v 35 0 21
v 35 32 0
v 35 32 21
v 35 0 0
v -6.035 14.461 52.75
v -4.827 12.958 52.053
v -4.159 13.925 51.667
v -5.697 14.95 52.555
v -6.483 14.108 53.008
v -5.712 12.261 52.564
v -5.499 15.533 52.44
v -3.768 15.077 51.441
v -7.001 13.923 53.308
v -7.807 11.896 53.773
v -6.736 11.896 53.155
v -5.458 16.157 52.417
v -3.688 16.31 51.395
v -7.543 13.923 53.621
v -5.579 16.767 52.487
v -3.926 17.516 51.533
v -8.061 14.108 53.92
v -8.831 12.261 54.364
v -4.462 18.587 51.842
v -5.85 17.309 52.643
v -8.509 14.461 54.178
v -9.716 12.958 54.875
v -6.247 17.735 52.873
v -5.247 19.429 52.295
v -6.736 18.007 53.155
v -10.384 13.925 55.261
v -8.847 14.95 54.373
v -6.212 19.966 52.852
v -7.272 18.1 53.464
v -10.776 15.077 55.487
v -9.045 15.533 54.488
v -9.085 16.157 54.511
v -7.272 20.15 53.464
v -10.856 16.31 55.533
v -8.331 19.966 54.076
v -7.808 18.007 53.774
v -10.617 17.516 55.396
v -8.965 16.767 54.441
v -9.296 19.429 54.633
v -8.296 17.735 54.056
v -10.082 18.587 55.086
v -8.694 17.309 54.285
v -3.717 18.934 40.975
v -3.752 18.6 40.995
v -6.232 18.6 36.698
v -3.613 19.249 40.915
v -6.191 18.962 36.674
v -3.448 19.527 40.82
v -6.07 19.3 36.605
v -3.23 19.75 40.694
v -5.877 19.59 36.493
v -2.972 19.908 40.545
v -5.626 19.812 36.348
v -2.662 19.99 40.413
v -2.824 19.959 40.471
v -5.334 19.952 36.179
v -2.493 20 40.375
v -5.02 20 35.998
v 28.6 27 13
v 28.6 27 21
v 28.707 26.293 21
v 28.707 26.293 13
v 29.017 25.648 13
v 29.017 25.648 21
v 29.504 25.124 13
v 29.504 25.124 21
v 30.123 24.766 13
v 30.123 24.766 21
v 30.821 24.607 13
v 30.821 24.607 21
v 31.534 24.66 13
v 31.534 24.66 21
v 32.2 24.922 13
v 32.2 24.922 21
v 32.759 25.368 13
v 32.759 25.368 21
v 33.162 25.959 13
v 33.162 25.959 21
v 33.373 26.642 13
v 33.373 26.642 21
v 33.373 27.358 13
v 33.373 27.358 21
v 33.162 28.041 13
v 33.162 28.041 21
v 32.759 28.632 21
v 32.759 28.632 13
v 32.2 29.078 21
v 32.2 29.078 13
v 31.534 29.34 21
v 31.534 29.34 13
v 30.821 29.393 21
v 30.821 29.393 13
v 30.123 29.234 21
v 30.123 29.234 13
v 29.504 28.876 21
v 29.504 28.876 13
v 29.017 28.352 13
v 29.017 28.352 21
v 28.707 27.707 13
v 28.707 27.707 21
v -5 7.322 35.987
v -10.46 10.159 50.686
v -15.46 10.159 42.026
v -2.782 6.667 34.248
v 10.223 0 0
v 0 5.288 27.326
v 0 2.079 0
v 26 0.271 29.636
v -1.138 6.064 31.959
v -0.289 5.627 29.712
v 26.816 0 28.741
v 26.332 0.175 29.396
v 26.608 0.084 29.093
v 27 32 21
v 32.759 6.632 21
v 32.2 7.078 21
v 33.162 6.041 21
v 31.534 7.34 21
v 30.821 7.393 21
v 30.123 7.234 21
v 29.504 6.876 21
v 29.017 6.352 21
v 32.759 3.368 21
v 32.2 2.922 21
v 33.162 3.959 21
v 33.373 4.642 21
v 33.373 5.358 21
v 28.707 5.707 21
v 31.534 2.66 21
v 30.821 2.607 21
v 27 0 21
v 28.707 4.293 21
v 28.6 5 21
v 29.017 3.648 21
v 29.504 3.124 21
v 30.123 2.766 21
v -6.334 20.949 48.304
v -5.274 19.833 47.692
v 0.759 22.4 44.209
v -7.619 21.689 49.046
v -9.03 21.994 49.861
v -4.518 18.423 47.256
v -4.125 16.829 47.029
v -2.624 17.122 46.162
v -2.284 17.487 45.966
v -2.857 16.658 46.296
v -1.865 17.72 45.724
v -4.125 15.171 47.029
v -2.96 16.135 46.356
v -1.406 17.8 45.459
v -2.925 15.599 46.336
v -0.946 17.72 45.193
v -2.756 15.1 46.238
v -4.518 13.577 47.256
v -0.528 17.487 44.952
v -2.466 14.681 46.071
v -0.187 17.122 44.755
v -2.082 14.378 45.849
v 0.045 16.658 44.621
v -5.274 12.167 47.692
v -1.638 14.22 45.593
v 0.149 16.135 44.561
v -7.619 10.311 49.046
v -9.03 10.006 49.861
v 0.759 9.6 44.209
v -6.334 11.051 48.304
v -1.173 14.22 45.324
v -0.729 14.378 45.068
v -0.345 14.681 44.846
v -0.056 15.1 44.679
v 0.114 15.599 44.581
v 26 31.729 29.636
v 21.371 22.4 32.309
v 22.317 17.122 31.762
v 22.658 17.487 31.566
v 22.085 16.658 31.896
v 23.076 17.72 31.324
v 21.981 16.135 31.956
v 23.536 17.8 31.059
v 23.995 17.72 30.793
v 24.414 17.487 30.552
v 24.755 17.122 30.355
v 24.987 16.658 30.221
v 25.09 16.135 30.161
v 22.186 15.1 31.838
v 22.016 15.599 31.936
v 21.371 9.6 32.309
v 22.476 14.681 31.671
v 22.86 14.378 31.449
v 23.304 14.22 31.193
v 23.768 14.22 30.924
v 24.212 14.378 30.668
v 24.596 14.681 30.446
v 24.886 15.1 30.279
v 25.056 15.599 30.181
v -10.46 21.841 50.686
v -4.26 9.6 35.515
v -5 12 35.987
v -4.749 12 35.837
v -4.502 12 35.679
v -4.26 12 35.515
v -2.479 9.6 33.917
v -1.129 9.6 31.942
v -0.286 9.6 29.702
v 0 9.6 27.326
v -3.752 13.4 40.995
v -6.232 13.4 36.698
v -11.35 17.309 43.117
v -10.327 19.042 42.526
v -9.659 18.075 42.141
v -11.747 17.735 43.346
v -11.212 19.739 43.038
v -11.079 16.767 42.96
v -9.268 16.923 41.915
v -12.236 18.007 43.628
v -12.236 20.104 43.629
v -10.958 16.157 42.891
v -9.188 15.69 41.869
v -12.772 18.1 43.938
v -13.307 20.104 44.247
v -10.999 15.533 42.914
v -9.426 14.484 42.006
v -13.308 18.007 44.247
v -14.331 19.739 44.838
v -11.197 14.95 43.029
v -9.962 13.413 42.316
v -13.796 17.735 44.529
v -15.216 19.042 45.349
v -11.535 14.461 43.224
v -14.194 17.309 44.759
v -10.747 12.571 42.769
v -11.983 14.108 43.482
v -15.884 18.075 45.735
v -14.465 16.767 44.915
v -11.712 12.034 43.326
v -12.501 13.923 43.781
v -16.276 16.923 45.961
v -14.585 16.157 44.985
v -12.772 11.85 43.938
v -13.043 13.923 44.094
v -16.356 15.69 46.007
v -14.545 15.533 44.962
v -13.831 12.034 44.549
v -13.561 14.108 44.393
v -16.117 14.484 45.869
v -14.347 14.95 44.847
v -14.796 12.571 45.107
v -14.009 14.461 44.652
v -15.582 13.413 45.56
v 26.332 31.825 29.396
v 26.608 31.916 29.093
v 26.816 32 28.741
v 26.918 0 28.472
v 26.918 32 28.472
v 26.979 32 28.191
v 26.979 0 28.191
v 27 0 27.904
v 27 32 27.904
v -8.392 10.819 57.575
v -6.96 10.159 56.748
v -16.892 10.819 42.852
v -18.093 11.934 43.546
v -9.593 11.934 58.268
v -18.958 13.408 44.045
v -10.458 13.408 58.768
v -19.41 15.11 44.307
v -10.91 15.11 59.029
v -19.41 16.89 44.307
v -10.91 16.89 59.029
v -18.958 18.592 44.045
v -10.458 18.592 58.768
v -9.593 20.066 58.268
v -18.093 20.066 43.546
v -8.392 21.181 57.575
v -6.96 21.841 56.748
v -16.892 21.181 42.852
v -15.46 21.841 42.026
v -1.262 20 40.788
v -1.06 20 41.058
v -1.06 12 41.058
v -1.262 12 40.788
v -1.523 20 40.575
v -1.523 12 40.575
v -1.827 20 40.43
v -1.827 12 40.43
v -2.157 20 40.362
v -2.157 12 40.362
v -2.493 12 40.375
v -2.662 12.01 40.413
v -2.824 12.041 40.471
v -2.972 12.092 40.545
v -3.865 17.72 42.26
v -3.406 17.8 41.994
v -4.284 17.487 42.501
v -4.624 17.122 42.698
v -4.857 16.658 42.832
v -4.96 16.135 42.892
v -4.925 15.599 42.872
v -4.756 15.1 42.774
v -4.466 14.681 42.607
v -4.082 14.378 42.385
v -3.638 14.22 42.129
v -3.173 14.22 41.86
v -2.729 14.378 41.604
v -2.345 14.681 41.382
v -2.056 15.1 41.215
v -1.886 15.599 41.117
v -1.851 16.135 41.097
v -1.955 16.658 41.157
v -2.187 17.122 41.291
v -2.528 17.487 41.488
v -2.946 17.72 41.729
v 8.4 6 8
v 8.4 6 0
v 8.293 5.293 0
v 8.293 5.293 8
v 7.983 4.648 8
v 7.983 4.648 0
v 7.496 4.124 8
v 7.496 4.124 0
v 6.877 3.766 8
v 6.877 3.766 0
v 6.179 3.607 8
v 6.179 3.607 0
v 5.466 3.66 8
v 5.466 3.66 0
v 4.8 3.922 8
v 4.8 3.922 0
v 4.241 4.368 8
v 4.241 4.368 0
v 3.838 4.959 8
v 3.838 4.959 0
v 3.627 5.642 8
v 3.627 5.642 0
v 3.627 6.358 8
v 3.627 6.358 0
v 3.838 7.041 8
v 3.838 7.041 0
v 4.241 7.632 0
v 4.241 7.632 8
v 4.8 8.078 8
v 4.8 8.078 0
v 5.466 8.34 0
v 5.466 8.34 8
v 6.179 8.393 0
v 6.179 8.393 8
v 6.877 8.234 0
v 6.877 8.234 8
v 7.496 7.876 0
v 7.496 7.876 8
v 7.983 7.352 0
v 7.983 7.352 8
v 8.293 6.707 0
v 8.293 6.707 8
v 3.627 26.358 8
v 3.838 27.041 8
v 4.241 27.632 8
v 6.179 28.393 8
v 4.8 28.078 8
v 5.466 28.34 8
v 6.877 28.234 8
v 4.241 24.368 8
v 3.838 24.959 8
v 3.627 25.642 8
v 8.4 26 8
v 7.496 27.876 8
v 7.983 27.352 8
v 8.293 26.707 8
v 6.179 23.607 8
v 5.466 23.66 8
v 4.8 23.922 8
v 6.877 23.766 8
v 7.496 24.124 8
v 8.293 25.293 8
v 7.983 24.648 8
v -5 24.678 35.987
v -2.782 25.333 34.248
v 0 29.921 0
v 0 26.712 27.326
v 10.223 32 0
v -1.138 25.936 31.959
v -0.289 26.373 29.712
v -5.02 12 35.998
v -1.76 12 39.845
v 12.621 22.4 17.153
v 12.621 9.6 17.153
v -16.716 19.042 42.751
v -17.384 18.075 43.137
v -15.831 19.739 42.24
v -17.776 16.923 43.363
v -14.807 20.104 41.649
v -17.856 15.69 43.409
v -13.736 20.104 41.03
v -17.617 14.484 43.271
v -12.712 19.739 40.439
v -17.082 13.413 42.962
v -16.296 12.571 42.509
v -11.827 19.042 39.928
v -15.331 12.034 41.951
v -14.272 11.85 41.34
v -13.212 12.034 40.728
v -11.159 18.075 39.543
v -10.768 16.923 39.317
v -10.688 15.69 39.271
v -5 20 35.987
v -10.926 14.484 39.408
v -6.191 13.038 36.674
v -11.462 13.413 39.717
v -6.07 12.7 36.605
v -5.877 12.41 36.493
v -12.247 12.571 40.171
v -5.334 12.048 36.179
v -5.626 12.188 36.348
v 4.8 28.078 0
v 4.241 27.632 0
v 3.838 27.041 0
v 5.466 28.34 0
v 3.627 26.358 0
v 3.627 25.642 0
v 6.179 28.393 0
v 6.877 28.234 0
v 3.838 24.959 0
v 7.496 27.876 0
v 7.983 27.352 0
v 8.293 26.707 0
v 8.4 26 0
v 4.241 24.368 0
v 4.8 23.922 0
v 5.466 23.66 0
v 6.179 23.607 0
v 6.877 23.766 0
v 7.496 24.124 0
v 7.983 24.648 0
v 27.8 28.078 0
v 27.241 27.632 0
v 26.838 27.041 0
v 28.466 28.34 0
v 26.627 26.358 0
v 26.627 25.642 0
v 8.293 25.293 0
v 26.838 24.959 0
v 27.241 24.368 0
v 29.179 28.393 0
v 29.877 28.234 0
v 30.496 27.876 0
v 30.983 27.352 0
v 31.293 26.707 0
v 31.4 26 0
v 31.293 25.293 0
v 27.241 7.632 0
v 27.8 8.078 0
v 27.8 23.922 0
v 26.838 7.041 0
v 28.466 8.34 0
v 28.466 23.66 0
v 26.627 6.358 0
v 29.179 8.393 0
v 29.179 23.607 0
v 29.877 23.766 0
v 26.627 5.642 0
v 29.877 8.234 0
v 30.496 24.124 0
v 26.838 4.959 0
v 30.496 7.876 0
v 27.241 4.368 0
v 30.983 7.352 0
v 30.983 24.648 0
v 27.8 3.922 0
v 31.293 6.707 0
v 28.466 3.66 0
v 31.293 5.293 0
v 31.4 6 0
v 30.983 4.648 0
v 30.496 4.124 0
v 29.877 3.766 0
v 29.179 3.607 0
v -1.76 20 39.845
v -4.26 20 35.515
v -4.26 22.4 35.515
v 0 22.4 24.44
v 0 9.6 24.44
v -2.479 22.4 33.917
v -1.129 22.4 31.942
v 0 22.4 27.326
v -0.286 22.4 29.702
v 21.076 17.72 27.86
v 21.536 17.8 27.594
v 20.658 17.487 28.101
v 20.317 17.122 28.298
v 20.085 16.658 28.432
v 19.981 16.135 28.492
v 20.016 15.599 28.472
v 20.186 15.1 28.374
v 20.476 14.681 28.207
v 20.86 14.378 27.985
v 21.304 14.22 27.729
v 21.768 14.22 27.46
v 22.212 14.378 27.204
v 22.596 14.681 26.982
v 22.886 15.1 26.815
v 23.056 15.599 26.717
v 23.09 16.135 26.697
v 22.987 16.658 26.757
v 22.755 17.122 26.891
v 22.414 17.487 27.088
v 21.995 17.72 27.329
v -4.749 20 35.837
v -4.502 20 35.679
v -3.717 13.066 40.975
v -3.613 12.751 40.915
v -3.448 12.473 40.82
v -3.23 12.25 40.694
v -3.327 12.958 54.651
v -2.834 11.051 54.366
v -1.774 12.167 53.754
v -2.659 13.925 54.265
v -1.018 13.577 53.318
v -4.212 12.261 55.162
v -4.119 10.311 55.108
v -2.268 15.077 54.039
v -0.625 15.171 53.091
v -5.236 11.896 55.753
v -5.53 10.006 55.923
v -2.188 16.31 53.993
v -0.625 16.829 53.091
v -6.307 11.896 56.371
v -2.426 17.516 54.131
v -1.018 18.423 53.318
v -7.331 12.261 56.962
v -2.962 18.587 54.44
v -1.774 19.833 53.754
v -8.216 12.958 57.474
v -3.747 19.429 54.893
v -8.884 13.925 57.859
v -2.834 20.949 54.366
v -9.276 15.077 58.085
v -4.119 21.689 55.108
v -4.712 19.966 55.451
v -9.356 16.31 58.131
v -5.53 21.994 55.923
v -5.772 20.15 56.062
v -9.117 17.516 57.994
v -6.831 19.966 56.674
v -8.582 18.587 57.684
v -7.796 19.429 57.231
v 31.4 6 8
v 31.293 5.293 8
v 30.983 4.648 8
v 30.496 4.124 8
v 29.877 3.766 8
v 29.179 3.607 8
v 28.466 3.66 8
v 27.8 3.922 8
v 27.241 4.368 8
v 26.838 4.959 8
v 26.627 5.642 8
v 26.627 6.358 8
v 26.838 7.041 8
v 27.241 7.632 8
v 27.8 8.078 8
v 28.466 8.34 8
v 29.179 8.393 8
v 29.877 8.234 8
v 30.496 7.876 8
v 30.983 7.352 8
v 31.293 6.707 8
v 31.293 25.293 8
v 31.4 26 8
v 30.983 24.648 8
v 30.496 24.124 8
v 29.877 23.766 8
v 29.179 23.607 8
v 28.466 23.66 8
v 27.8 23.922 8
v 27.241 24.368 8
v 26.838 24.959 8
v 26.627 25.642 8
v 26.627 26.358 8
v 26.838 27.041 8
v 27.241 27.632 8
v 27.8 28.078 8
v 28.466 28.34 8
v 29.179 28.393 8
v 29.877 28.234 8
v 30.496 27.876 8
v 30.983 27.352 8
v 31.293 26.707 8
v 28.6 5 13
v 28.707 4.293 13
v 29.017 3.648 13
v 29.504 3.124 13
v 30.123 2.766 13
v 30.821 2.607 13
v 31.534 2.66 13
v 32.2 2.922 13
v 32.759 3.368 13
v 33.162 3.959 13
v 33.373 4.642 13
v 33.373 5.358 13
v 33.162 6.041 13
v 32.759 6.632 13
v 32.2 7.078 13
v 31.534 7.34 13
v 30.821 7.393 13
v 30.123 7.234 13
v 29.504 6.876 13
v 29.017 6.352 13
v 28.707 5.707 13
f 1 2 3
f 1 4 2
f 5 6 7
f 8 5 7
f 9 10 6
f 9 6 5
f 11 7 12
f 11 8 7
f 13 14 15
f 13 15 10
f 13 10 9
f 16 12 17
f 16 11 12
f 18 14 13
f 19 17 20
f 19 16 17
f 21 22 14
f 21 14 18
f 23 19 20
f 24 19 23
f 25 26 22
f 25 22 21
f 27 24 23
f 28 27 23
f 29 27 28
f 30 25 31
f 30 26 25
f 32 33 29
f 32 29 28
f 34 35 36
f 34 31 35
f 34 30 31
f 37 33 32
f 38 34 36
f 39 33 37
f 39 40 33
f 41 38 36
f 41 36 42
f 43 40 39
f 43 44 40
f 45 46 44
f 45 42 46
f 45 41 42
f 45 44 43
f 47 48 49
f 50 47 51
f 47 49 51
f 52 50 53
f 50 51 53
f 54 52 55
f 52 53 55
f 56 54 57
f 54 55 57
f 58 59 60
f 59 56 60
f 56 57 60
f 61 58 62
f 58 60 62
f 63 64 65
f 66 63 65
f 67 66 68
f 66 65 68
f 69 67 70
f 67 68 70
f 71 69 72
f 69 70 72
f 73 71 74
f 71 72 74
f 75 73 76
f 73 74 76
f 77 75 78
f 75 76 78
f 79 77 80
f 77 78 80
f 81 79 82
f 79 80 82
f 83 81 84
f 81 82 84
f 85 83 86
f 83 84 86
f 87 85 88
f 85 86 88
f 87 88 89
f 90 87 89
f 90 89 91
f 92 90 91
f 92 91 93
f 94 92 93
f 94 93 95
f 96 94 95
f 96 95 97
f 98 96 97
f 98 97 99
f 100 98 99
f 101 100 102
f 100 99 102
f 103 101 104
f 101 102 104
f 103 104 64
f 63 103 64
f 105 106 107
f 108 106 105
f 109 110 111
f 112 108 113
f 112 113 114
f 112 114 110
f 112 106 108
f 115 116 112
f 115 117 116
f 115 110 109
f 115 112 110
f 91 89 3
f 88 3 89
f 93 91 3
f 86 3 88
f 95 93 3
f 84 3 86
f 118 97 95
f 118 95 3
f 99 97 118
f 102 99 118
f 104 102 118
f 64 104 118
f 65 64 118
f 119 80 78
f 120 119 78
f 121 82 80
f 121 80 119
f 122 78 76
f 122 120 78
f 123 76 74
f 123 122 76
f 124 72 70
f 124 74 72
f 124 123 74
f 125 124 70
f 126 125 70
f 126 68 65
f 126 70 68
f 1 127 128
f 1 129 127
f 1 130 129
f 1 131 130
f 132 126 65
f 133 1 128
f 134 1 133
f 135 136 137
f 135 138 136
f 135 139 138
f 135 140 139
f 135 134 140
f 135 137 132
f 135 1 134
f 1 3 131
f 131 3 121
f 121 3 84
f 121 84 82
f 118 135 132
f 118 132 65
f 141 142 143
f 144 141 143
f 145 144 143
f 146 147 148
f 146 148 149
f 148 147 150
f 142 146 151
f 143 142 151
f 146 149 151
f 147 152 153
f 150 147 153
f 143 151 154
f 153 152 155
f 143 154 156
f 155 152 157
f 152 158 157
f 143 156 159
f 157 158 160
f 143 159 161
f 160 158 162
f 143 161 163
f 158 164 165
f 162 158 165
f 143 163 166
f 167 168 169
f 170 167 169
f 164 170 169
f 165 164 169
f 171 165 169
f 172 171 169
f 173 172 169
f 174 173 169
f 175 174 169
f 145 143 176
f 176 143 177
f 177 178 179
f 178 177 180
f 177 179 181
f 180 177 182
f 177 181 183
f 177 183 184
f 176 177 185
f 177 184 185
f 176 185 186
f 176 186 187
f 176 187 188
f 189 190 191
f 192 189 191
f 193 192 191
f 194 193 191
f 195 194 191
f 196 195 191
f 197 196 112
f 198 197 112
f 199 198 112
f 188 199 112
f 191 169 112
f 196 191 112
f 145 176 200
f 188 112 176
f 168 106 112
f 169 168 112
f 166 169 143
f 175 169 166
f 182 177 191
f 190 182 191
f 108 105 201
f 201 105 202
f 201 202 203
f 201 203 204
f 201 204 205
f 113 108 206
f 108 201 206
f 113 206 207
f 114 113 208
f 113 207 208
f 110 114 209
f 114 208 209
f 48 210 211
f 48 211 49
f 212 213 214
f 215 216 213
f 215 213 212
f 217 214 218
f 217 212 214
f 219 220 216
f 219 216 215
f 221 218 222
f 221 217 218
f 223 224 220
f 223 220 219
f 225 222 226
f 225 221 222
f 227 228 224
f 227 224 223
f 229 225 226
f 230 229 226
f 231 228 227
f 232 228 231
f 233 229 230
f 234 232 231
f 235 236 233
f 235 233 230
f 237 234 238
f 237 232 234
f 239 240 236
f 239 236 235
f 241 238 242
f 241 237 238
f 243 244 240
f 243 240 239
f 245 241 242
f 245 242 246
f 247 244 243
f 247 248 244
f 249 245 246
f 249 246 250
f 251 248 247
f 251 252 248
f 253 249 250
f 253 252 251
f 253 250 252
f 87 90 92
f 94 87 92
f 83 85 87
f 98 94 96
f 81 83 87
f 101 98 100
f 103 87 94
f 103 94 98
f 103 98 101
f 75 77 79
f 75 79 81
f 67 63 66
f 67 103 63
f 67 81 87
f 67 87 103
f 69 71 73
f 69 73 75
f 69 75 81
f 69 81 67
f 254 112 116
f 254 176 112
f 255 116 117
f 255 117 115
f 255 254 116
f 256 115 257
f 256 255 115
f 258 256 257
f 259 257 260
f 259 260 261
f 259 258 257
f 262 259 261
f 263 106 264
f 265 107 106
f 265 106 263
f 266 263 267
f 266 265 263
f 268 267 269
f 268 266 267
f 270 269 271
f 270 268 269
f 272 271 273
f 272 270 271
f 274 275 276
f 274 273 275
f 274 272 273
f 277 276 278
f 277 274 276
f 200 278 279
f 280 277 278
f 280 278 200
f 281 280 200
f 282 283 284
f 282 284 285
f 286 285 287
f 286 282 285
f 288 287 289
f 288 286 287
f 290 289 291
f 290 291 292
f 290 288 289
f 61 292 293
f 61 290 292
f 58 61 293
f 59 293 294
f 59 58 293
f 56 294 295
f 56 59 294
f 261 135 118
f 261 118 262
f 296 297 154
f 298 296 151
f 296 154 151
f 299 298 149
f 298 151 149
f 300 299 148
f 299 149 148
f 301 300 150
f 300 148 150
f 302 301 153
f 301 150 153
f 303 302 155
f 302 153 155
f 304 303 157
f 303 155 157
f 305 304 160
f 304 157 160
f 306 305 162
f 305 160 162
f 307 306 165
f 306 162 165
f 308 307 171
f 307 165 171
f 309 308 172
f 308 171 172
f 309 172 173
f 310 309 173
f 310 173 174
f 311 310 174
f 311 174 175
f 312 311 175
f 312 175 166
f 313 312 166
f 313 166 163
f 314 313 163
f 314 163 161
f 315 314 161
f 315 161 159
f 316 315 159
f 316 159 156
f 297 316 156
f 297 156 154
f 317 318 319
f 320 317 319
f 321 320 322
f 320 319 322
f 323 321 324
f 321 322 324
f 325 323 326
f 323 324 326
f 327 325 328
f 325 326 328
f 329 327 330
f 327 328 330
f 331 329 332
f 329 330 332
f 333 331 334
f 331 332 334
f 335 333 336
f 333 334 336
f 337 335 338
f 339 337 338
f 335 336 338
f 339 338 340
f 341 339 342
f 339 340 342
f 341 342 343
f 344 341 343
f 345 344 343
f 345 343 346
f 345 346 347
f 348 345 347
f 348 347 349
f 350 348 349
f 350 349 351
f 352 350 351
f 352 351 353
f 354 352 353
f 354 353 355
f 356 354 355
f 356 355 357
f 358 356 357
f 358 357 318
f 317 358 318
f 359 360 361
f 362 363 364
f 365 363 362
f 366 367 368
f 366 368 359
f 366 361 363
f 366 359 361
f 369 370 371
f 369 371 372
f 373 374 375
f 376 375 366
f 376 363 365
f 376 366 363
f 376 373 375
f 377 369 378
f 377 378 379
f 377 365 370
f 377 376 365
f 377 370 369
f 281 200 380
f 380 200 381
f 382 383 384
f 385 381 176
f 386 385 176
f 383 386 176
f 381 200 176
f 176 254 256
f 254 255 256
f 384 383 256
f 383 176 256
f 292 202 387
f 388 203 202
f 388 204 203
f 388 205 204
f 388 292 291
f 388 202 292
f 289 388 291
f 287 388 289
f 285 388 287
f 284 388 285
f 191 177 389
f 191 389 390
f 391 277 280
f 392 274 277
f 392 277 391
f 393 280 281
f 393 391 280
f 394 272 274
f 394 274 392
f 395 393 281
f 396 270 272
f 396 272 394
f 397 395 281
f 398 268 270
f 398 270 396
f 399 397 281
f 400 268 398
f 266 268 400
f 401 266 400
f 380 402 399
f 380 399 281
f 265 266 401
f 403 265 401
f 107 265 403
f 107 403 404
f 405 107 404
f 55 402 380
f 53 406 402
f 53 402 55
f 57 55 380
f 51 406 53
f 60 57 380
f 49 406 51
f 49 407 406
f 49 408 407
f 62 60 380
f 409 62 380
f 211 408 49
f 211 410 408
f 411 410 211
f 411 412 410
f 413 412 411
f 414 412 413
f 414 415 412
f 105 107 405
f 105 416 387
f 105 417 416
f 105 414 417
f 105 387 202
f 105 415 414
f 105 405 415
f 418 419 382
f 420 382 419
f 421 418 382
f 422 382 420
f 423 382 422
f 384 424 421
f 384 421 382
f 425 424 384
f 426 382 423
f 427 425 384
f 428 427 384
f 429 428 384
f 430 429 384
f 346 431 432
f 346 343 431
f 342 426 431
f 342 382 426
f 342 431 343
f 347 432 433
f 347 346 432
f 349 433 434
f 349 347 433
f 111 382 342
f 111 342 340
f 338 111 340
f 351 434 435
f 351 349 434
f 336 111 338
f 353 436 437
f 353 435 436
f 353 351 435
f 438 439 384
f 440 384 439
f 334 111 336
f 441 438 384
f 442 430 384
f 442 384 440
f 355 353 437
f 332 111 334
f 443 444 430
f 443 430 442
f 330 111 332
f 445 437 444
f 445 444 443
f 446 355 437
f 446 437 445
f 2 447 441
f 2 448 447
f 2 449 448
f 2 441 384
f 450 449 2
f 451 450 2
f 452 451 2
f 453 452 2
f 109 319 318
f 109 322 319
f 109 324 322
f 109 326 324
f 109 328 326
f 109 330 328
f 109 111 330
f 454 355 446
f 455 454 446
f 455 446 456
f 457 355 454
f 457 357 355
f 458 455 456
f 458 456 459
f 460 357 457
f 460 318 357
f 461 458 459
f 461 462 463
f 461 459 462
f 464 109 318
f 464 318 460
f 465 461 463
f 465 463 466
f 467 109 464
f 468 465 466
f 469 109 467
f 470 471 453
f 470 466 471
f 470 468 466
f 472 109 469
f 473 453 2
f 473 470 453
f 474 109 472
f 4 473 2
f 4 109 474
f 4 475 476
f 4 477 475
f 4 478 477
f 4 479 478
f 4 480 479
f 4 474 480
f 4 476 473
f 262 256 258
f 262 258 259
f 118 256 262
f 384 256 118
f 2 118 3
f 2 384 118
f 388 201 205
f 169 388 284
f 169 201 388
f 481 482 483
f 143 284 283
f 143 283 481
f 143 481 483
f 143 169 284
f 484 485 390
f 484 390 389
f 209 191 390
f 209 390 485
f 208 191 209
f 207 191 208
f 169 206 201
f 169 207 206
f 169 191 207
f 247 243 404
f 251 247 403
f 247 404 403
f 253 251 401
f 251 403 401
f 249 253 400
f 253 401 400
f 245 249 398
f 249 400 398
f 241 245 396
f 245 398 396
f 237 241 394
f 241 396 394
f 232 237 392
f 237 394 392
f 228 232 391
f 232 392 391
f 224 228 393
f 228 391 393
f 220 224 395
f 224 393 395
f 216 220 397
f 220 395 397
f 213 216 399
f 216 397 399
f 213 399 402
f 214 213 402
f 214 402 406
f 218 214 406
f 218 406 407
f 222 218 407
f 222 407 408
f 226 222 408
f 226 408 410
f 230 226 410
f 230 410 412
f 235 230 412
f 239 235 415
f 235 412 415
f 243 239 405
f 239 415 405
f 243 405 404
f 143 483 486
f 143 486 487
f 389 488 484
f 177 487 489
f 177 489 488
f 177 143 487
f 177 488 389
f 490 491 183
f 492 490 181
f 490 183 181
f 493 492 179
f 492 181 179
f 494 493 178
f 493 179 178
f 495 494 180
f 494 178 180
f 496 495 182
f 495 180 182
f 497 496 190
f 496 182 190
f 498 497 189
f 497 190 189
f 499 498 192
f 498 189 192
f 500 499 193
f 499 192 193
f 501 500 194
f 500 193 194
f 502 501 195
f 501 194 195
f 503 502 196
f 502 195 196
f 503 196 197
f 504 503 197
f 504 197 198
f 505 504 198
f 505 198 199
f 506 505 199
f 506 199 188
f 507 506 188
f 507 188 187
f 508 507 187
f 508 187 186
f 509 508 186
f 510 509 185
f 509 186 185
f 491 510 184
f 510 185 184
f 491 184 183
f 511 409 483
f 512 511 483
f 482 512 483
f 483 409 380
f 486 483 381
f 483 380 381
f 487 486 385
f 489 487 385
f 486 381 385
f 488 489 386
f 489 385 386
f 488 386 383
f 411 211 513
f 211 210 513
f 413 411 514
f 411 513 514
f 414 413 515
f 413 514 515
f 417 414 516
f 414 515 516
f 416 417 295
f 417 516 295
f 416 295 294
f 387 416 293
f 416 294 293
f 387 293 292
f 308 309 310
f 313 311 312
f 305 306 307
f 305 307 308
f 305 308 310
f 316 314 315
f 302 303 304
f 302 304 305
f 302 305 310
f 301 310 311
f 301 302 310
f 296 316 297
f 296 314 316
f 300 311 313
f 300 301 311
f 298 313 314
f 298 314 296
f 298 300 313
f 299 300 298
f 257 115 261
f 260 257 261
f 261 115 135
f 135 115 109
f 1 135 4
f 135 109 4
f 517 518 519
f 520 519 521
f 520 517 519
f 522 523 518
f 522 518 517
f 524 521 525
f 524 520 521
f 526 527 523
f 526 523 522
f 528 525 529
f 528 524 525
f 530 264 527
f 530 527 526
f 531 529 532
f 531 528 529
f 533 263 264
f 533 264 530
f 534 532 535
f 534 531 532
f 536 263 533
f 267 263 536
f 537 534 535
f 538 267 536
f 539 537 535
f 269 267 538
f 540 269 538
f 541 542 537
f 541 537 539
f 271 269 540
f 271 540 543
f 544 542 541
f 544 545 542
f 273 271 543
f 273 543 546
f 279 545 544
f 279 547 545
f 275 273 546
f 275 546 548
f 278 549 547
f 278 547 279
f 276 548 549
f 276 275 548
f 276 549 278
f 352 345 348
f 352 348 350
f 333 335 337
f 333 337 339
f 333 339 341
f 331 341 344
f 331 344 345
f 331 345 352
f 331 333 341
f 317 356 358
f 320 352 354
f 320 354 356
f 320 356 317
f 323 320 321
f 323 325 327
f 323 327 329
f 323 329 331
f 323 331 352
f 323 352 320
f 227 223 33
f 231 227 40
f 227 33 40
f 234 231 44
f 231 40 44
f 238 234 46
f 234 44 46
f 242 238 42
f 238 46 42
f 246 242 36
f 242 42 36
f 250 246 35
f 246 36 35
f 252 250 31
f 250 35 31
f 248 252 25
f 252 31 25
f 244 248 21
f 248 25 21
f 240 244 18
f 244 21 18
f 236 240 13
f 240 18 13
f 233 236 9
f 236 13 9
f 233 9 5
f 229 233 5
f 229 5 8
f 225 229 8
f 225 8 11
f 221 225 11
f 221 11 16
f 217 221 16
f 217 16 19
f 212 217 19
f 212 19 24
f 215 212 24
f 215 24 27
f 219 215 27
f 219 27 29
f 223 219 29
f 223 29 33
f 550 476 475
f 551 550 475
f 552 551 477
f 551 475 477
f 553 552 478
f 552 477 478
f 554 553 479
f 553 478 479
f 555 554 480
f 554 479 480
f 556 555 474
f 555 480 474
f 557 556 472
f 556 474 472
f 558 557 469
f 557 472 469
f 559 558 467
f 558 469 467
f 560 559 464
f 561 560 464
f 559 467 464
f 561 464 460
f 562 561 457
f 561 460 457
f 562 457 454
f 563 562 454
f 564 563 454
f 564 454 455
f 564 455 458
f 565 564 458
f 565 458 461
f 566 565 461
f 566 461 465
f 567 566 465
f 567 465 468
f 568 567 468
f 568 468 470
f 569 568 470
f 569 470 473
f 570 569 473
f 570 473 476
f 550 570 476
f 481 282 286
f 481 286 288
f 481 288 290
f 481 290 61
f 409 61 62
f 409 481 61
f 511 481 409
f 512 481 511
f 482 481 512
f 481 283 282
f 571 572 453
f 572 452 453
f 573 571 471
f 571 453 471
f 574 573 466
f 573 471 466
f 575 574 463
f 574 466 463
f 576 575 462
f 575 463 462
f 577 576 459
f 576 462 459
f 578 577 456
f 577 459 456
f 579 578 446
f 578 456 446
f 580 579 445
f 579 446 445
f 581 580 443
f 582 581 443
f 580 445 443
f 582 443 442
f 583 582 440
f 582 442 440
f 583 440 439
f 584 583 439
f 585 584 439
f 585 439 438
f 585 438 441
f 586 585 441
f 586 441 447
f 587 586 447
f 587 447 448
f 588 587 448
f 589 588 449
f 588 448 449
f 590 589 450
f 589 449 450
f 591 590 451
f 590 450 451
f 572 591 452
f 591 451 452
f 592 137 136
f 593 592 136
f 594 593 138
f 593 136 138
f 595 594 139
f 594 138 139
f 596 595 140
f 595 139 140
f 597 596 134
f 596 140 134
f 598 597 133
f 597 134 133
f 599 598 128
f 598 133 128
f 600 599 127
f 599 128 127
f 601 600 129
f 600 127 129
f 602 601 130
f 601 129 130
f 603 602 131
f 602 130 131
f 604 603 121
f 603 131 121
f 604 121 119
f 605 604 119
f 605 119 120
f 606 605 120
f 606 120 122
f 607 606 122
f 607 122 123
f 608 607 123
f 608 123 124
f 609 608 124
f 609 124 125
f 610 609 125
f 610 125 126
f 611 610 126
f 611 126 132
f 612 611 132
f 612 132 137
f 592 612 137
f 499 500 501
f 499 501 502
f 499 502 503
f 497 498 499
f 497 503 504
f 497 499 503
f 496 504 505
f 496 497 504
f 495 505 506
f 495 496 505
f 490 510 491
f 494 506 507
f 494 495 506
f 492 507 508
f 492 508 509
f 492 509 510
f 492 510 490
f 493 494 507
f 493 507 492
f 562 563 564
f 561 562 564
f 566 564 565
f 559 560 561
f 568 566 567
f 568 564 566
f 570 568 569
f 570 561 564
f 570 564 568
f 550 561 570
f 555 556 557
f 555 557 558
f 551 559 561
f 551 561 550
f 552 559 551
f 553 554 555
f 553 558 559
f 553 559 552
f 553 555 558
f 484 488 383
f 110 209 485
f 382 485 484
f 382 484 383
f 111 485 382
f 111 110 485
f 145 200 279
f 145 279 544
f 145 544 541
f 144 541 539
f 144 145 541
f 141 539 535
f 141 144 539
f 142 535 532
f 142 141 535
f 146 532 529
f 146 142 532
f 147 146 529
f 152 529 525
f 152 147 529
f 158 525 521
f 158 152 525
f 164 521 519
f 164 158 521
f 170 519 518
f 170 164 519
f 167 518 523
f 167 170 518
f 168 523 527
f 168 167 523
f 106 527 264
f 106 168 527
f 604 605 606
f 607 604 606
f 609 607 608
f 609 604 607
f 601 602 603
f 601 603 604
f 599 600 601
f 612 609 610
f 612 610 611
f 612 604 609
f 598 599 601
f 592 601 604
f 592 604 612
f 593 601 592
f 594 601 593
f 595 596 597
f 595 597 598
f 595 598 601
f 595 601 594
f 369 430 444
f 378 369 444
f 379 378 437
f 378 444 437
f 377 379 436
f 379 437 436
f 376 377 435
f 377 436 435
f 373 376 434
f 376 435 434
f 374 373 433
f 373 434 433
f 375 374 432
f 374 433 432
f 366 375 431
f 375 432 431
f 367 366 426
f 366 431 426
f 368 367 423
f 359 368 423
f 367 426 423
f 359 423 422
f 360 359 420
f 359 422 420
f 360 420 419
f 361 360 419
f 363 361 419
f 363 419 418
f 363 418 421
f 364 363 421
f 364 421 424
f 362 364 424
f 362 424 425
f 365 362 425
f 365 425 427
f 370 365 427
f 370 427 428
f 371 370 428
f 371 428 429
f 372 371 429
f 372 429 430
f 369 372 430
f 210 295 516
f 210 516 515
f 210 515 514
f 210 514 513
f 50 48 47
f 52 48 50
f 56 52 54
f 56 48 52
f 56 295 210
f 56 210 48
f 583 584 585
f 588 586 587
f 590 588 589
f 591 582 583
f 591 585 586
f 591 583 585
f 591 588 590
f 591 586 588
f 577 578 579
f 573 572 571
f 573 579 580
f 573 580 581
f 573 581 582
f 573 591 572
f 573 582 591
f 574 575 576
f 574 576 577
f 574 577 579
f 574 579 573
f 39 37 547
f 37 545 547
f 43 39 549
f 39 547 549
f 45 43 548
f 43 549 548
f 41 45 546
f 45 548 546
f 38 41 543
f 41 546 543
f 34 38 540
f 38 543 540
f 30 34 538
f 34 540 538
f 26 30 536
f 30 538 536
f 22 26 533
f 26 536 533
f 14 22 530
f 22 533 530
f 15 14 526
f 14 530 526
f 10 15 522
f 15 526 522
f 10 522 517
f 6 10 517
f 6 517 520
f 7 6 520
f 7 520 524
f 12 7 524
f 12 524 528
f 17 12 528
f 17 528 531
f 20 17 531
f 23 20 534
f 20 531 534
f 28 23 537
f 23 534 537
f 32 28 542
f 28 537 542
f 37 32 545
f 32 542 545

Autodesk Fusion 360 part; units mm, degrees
sketch "Main" plane through (0, 0, 0) normal (0, 1, 0) x (1, 0, 0)
  line L0 (0, 0) -> (35, 0)
  line L1 (35, 0) -> (35, -21)
  line L2 (-19.4678, -44.3397) -> (-14.4678, -53)
  line L3 (-19.4678, -44.3397) -> (0, -33.1)
  line L4 (0, -33.1) -> (0, 0)
  line L5 (-14.4678, -53) -> (27, -29.0585)
  line L6 (35, -21) -> (27, -21)
  line L7 (27, -21) -> (27, -29.0585)
  dimension "d1" = 35
  dimension "d2" = 21
  dimension "d4" = 10
  dimension "d5" = 60
  dimension "d7" = 53
  dimension "d34" = 33.1
  dimension "d35" = 8
extrude "Extrude1" add sketch "Main" along normal blind 32
sketch "Upper Cut " plane through (19.3327, 0, 33.4853) normal (0.5, 0, 0.866) x (0, 1, 0)
  line L0 (0, 39.0295) -> (0, -8.8534)
  line L1 (32, -8.8534) -> (32, 39.0295)
  line L2 (32, 39.0295) -> (0, 39.0295)
  line L3 (0, -30.3109) -> (32, -30.3109) construction
  line L4 (16, 39.0295) -> (16, -30.3109) construction
  arc A0 (21.8411, 34.4013) -> (10.1589, 34.4013) centre (16, 33.0295) ccw
  line L5 (10.1589, 34.4013) -> (0, -8.8534)
  line L6 (21.8411, 34.4013) -> (32, -8.8534)
  line L7 (0, -8.8534) -> (32, -8.8534)
  dimension "d11" = 6
extrude "Extrude2" cut sketch "Upper Cut " against normal blind 43 contours L0 L2 A0 L5 | L1 L2 A0 L6
sketch "Tube Extension" plane through (19.3327, 0, 33.4853) normal (0.5, 0, 0.866) x (0, 1, 0)
  line L0 (32, -8.8534) -> (21.8411, 34.4013)
  arc A0 (21.8411, 34.4013) -> (10.1589, 34.4013) centre (16, 33.0295) ccw
  line L1 (10.1589, 34.4013) -> (0, -8.8534)
  circle A1 centre (16, 33.0295) radius 6
  line L2 (0, -8.8534) -> (32, -8.8534)
  dimension "d14" = 12
extrude "Extrude3" add sketch "Tube Extension" along normal blind 7 contours A0 A1
sketch "Tube Hole" plane through (22.8327, 0, 39.5474) normal (0.5, 0, 0.866) x (0, 1, 0)
  circle A0 centre (16, 33.0295) radius 6
  circle A1 centre (16, 33.0295) radius 2.1
  dimension "d17" = 4.2
extrude "Extrude4" cut sketch "Tube Hole" against normal up to surface (17 mm away) contours A1
fillet "Fillet1" radius 10 1 edges at (0, 16, 33.1)
sketch "Servo Holes" plane through (19.3327, 0, 33.4853) normal (0.5, 0, 0.866) x (0, 1, 0)
  arc A0 (10.1589, 34.4013) -> (21.8411, 34.4013) centre (16, 33.0295) ccw
  line L0 (10.1589, 34.4013) -> (0, -8.8534)
  line L1 (32, -8.8534) -> (21.8411, 34.4013)
  line L2 (16, 27.0295) -> (16, -8.8534) construction
  line L3 (9.6, 21.4466) -> (22.4, 21.4466)
  line L4 (22.4, 21.4466) -> (22.4, -2.3534)
  line L5 (22.4, -2.3534) -> (9.6, -2.3534)
  line L6 (9.6, -2.3534) -> (9.6, 21.4466)
  circle A1 centre (16, 23.9466) radius 1.8
  circle A2 centre (16, -4.8534) radius 1.8
  line L7 (0, -8.8534) -> (32, -8.8534)
  dimension "d22" = 12.8
  dimension "d23" = 23.8
  dimension "d24" = 6.4
  dimension "d28" = 3.6
  dimension "d29" = 3.6
  dimension "d30" = 28.8
  dimension "d31" = 2.5
  dimension "d36" = 6.5
extrude "Extrude5" cut sketch "Servo Holes" against normal blind 17.5 contours L3 L4 L5 L6
extrude "Extrude6" cut sketch "Servo Holes" against normal blind 4 contours A1 | A2
fillet "Fillet3" radius 2 1 edges at (27, 16, 29.0585)
sketch "Top Plate Holes" plane through (0, 0, 21) normal (0, 0, 1) x (-1, 0, 0)
  line L0 (-27, 0) -> (-35, 0)
  line L1 (-35, 0) -> (-35, -32)
  line L2 (-35, -32) -> (-27, -32)
  line L3 (-27, -32) -> (-27, 0)
  line L4 (-31, -32) -> (-31, 0) construction
  circle A0 centre (-31, -27) radius 2.4
  circle A1 centre (-31, -5) radius 2.4
  dimension "d41" = 4.8
  dimension "d42" = 4.8
  dimension "d44" = 22
  dimension "d45" = 5
extrude "Extrude7" cut sketch "Top Plate Holes" against normal blind 8 contours A0 | A1
sketch "Base Holes" plane through (0, 0, 0) normal (0, 0, -1) x (1, 0, 0)
  line L0 (10.223, 0) -> (0, -2.0793)
  line L1 (0, -2.0793) -> (0, -29.9207)
  line L2 (0, -29.9207) -> (10.223, -32)
  line L3 (10.223, -32) -> (35, -32)
  line L4 (35, -32) -> (35, 0)
  line L5 (35, 0) -> (10.223, 0)
  circle A0 centre (6, -6) radius 2.4
  circle A1 centre (29, -6) radius 2.4
  circle A2 centre (6, -26) radius 2.4
  circle A3 centre (29, -26) radius 2.4
  dimension "d59" = 4.8
  dimension "d61" = 6
  dimension "d62" = 6
  dimension "d65" = 23
  dimension "d66" = -20
extrude "Extrude8" cut sketch "Base Holes" against normal blind 8 contours A0 | A1 | A2 | A3
sketch "Servo Wires " plane through (-18.5733, 0, 10.7233) normal (0.866, 0, -0.5) x (0, 1, 0)
  line L0 (9.6, 28.6269) -> (22.4, 28.6269)
  line L1 (22.4, 28.6269) -> (22.4, 38.6654)
  line L2 (22.4, 38.6654) -> (9.6, 38.6654)
  line L3 (9.6, 38.6654) -> (9.6, 28.6269)
  line L4 (12, 33.6269) -> (20, 33.6269)
  line L5 (20, 33.6269) -> (20, 28.6269)
  line L6 (20, 28.6269) -> (12, 28.6269)
  line L7 (12, 28.6269) -> (12, 33.6269)
  dimension "d93" = 8
  dimension "d94" = 2.4
  dimension "d95" = 5
extrude "Extrude9" cut sketch "Servo Wires " against normal blind 2.3 contours L0 L4 L5 L6 L7
fillet "Fillet4" radius 1.4 3 edges at (-1.7598, 16, 39.8451) (-4.9921, 12, 38.8467) (-4.9921, 20, 38.8467)
sketch "Sketch11" plane through (22.8327, 0, 39.5474) normal (0.5, 0, 0.866) x (0, 1, 0)
  circle A0 centre (16, 33.0295) radius 2.1
  circle A1 centre (16, 33.0295) radius 6
  circle A2 centre (16, 33.0295) radius 4.15
  dimension "d100" = 8.3
extrude "Extrude10" cut sketch "Sketch11" against normal blind 3 contours A2
sketch "Sketch12" plane through (14.3327, 0, 24.825) normal (-0.5, 0, -0.866) x (0, -1, 0)
  line L0 (-12, 22.3466) -> (-12, 22.3235)
  line L1 (-12, 22.3235) -> (-7.3223, 22.3235)
  line L2 (-7.3223, 22.3235) -> (-10.1589, 34.4013)
  arc A0 (-10.1589, 34.4013) -> (-21.8411, 34.4013) centre (-16, 33.0295) ccw
  line L3 (-21.8411, 34.4013) -> (-24.6777, 22.3235)
  line L4 (-24.6777, 22.3235) -> (-20, 22.3235)
  line L5 (-20, 22.3235) -> (-20, 22.3466)
  arc A1 (-18.6, 23.7466) -> (-20, 22.3466) centre (-18.6, 22.3466) ccw
  line L6 (-18.6, 23.7466) -> (-13.4, 23.7466)
  arc A2 (-12, 22.3466) -> (-13.4, 23.7466) centre (-13.4, 22.3466) ccw
  circle A3 centre (-16, 33.0295) radius 2.1
  circle A4 centre (-16, 33.0295) radius 4.15
  dimension "d103" = 8.3
extrude "Extrude11" cut sketch "Sketch12" against normal blind 3 contours A4
